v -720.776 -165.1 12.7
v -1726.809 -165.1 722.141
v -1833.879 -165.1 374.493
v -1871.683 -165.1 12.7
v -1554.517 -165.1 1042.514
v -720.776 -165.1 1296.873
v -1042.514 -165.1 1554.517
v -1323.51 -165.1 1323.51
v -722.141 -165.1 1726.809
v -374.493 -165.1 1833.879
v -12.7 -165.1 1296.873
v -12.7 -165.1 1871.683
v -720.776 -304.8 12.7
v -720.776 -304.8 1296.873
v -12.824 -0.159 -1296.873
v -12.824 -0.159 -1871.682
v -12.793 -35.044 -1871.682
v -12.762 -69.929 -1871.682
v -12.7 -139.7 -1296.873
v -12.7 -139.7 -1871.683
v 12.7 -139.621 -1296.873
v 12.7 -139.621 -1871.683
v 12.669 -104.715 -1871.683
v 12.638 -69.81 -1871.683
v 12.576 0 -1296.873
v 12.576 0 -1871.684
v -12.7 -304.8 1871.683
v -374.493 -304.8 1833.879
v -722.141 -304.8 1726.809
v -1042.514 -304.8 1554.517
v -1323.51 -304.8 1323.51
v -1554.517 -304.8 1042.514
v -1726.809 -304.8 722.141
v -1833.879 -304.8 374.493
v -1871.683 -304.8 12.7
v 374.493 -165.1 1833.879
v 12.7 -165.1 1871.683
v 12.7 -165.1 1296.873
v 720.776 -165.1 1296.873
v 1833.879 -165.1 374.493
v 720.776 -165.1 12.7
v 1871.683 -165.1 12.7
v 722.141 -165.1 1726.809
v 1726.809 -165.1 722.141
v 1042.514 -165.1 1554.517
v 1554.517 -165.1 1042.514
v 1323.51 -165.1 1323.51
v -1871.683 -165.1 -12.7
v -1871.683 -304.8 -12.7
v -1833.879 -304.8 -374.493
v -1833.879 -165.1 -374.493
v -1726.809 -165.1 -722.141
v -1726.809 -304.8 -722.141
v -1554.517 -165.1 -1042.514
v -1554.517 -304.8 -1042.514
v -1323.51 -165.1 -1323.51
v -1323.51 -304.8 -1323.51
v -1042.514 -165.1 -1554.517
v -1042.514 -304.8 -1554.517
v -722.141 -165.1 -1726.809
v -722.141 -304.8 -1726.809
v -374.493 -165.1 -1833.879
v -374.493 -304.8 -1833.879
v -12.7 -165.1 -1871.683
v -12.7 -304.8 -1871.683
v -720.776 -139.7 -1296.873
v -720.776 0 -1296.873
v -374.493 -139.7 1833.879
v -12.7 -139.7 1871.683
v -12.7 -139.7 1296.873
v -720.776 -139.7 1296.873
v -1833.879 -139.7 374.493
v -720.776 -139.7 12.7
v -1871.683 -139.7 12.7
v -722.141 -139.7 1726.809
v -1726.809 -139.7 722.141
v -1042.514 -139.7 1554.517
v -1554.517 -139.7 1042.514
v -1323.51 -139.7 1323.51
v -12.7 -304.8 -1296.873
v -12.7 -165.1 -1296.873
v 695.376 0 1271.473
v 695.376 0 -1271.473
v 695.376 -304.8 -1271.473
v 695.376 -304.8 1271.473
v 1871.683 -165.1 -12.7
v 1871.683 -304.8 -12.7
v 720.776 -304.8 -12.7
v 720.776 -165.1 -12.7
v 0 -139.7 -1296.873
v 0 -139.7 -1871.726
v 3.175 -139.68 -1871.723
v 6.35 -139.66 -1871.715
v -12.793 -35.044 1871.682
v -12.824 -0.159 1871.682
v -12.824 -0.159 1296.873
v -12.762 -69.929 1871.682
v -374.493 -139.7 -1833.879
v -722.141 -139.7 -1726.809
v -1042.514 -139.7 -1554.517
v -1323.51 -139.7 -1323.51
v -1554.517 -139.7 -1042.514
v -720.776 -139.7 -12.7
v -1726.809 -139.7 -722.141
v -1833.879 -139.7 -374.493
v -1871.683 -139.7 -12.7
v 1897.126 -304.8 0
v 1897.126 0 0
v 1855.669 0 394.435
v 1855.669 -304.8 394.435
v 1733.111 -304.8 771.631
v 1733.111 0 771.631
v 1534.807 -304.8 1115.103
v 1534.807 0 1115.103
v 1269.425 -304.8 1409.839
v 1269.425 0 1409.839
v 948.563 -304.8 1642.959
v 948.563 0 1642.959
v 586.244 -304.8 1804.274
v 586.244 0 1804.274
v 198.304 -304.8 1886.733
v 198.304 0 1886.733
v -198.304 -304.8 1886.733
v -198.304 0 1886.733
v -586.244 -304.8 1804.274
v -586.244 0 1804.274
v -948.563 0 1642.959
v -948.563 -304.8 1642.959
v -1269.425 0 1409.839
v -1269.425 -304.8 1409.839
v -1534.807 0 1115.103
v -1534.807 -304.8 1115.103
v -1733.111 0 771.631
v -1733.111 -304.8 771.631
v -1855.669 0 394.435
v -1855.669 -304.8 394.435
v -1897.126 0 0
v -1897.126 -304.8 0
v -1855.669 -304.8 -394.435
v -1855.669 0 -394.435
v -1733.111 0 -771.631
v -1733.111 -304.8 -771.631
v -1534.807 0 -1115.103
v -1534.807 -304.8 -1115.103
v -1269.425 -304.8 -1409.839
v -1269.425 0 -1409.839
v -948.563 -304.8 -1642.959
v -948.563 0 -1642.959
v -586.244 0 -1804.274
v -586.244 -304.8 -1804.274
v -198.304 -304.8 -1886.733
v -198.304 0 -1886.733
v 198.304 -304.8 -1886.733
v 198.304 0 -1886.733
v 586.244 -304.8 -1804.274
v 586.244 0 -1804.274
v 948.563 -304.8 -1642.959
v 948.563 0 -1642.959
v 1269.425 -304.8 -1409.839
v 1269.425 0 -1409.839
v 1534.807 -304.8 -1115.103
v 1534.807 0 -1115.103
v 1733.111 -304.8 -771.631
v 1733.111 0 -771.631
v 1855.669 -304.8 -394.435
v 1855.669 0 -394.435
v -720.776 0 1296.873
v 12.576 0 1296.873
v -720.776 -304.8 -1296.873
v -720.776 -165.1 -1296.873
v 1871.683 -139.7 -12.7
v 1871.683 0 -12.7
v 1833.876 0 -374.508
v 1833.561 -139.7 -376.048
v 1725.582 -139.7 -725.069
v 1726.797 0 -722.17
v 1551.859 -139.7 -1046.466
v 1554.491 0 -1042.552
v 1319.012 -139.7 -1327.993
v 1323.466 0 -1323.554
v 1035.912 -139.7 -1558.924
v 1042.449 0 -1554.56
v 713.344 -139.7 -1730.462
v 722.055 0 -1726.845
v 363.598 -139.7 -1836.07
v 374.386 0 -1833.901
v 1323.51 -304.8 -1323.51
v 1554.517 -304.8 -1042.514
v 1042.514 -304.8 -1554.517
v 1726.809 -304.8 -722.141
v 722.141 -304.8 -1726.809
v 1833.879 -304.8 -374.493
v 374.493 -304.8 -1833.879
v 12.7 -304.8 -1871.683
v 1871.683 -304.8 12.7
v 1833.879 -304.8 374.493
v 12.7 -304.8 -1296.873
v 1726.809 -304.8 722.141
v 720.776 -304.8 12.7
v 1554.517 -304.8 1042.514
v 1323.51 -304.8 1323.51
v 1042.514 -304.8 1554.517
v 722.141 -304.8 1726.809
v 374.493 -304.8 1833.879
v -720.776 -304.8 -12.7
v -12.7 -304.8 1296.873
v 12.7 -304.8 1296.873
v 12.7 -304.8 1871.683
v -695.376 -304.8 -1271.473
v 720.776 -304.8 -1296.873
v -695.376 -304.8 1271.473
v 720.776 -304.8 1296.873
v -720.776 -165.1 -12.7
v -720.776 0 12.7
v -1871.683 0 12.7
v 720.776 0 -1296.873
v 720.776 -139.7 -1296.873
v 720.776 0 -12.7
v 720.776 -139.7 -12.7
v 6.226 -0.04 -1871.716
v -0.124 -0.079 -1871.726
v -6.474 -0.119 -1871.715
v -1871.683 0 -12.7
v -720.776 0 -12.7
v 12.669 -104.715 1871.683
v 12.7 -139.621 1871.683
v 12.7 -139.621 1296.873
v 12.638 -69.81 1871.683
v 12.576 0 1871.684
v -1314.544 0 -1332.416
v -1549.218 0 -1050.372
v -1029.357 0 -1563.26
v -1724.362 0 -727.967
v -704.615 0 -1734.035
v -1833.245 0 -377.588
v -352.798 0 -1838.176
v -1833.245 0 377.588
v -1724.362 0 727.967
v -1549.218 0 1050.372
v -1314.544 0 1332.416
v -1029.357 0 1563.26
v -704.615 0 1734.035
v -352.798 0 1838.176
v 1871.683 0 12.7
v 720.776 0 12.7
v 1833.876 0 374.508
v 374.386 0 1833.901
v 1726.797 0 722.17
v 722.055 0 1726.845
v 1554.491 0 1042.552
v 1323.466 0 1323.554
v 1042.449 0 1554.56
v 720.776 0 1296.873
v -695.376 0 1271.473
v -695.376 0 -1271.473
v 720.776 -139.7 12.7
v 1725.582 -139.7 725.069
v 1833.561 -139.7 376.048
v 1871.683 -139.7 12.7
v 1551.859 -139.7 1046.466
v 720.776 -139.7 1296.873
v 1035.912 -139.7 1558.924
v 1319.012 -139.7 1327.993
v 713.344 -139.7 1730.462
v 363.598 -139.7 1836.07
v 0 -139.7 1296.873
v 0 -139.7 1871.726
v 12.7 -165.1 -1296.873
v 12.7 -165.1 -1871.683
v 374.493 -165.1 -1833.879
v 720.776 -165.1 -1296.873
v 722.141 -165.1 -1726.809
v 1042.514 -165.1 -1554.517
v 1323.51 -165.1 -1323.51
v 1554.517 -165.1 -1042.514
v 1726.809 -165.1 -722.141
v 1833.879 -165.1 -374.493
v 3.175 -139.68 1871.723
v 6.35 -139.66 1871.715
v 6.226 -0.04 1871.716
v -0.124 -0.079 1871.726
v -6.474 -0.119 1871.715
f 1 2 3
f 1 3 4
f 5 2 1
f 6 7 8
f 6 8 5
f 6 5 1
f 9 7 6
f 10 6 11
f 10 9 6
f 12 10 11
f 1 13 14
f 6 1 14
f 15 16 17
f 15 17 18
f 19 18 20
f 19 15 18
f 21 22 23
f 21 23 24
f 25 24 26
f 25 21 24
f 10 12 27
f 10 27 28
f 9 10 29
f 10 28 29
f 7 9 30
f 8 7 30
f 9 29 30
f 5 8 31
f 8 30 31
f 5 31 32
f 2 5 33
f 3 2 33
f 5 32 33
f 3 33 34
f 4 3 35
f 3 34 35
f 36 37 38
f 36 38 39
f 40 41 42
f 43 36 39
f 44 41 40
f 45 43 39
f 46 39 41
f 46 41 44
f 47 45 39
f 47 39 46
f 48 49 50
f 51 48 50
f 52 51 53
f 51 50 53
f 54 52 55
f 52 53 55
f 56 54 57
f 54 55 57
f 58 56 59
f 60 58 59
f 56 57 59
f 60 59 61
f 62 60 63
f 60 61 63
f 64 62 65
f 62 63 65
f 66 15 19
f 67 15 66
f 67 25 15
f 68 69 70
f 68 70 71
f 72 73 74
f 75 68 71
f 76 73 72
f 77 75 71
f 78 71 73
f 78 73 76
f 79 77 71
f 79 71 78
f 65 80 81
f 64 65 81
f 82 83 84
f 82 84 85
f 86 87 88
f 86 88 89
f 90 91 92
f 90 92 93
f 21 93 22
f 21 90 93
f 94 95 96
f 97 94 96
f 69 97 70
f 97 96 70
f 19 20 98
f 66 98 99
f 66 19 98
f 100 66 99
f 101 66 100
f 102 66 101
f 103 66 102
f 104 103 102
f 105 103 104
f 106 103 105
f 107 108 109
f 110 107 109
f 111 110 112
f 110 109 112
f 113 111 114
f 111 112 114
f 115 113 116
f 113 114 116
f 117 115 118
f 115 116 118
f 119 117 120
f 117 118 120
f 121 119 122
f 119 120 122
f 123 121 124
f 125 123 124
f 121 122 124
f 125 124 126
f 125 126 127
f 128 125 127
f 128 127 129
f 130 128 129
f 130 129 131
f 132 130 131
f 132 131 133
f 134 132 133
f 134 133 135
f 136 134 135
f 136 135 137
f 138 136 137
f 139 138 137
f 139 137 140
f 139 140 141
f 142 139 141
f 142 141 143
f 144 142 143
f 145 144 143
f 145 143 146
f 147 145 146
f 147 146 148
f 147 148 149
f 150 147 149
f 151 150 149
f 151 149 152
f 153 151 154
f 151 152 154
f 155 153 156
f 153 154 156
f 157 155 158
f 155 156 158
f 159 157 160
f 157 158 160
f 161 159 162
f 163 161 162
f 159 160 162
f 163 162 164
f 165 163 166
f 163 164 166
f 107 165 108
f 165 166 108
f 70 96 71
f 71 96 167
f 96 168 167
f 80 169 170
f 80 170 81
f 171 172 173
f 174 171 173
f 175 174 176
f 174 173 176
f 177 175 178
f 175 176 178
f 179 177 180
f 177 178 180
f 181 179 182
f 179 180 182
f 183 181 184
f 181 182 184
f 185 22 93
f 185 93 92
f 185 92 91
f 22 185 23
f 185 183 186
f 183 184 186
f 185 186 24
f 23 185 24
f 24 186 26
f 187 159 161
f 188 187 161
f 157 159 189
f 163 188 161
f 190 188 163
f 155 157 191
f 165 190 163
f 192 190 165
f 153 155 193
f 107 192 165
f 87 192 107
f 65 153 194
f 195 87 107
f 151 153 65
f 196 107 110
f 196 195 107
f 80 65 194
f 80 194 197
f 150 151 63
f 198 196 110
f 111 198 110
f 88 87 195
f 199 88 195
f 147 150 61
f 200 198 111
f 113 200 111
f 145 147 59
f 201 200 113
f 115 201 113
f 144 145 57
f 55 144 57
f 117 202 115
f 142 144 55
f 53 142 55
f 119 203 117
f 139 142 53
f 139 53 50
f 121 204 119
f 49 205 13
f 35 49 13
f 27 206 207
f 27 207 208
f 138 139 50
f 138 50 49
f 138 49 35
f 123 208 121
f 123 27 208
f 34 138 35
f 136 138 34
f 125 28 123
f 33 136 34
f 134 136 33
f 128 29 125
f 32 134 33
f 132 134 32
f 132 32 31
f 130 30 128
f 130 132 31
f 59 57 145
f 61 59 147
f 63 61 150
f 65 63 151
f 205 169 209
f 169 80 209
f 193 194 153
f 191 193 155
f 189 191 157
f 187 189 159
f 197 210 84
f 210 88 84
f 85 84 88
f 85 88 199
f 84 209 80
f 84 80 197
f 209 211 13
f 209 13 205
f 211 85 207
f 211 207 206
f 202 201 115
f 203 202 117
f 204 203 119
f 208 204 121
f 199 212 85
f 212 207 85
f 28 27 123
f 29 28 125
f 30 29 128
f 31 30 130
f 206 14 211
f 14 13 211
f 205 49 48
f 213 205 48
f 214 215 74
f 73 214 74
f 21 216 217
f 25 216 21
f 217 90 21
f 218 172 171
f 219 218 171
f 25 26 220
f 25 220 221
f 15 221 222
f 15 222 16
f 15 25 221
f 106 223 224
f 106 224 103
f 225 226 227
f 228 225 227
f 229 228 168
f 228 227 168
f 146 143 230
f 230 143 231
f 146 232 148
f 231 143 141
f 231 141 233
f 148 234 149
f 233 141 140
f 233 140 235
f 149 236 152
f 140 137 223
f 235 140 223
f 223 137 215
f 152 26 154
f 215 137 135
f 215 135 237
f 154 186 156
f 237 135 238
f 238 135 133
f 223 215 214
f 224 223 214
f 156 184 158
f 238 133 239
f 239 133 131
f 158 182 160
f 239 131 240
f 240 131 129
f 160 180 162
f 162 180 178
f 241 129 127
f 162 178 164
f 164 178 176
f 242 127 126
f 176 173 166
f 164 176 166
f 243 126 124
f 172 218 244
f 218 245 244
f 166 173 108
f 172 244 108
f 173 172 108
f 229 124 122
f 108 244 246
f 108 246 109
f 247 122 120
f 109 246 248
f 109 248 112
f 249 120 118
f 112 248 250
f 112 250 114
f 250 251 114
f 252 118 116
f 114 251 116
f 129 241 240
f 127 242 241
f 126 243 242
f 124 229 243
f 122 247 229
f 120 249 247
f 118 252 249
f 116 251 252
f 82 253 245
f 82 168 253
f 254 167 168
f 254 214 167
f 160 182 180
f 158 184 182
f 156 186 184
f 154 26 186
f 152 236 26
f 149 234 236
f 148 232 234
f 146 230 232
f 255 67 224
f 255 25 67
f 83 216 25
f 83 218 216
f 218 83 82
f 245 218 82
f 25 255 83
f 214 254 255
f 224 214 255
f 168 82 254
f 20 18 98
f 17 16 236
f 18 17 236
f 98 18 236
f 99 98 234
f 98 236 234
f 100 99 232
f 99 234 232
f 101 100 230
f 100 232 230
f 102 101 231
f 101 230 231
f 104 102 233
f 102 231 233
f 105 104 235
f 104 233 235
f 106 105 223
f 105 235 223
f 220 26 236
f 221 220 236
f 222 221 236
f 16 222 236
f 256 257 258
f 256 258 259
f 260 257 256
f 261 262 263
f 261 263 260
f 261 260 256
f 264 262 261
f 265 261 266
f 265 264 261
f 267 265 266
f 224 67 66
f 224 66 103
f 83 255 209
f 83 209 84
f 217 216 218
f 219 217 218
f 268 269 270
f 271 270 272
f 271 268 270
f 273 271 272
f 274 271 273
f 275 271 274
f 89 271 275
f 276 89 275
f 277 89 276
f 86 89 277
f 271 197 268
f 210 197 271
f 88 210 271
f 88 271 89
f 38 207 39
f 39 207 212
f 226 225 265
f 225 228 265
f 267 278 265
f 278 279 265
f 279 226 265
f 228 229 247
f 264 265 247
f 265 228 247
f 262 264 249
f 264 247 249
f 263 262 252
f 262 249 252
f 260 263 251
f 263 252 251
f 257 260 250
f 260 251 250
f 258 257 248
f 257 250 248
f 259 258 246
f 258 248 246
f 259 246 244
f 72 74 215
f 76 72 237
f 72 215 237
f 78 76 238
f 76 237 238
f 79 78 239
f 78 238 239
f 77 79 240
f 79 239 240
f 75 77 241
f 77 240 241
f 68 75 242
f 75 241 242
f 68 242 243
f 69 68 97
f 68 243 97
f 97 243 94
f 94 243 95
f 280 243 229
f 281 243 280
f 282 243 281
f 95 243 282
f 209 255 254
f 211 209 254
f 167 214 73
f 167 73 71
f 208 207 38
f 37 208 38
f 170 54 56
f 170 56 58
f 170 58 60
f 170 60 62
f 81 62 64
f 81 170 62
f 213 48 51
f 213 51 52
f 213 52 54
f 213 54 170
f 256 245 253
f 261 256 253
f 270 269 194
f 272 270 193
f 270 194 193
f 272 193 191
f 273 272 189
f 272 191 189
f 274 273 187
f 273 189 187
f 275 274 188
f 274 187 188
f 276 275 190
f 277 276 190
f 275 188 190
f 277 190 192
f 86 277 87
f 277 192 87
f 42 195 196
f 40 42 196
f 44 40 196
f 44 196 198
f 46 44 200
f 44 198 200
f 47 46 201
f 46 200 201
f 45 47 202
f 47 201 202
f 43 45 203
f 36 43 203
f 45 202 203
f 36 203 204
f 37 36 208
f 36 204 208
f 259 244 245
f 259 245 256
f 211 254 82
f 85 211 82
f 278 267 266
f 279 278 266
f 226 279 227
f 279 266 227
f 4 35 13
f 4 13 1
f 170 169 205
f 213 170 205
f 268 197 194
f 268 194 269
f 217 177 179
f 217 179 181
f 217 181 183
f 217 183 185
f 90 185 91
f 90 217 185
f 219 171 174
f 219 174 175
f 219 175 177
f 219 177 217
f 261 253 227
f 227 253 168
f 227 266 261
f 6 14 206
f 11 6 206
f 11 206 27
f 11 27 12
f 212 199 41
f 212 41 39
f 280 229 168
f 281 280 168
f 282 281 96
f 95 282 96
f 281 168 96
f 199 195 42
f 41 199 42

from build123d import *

# Parameters (mm, degrees)
F0_R     = 1897.126
F0_W     = 1390.7516
F0_H     = 2542.9464
F1_DEPTH = 304.8
F2_R     = 1871.726
F2_W     = 1441.5516
F2_H     = 2593.7464
F3_DEPTH = 139.7
F4_R     = 1871.726
F4_W     = 1441.5516
F4_H     = 2593.7464
F5_DEPTH = 139.7
F6_W     = 139.7
F6_H     = 25.4
F9_W     = 25.4
F9_H     = 139.7


# Not quite as in the source:
# - a feature of the source that left no trace in its solid (it failed there, or was rolled back) is left out
# - a pattern or mirror of a feature is missing from the dataset's text; its kind, count and spacing are read off the source's solid


with BuildPart() as f1:
    # F0 (on Front) → F1 (new body)
    with BuildSketch(Plane.XZ):
        Circle(F0_R)
        Rectangle(F0_W, F0_H, mode=Mode.SUBTRACT)
    extrude(amount=F1_DEPTH)

    # F2 (on face) → F3 (cut)
    with BuildSketch(Plane.XZ.offset(304.8)):
        Circle(F2_R)
        Rectangle(F2_W, F2_H, mode=Mode.SUBTRACT)
    extrude(amount=-F3_DEPTH, mode=Mode.SUBTRACT)

    # F4 (on face) → F5 (cut)
    with BuildSketch(Plane(origin=(0, 0, 0), x_dir=(-1, 0, 0), z_dir=(0, 1, 0))):
        Circle(F4_R)
        Rectangle(F4_W, F4_H, mode=Mode.SUBTRACT)
    extrude(amount=-F5_DEPTH, mode=Mode.SUBTRACT)

    # F6 (on face) → F7 (join, up to the next surface of F1)
    with BuildSketch(Plane.YZ.offset(720.7758)):
        with Locations((-234.95, 0)):
            Rectangle(F6_W, F6_H)
    f7 = extrude(until=Until.NEXT)

    # F7_copies: F7 across plane
    add(f7.mirror(Plane.ZX.offset(-152.4)))

    # F8: F1 across plane


with BuildPart() as f1_1:
    add(f1.part)
    add(f1.part.mirror(Plane.YZ))

    # F9 (on face) → F10 (join, up to the next surface of F1)
    with BuildSketch(Plane.XY.offset(1296.8732)):
        with Locations((0, -234.95)):
            Rectangle(F9_W, F9_H)
    extrude(until=Until.NEXT)

    # F11: F1 across plane


with BuildPart() as f1_2:
    add(f1_1.part)
    add(f1_1.part.mirror(Plane.XY))

    # F12 (on face) → F13 (join, up to the next surface of F1)
    with BuildSketch(Plane.XY.offset(1296.8732)):
        Polygon((12.6997518255, -139.6206049634), (12.5756783059, 0), (-12.823825345, -0.1587900733), (-12.6997518255, -139.7793950366), align=None)
    extrude(until=Until.NEXT)

    # F14: F1 across plane


with BuildPart() as f1_3:
    add(f1_2.part)
    add(f1_2.part.mirror(Plane.XY))


solid = f1_3.part
